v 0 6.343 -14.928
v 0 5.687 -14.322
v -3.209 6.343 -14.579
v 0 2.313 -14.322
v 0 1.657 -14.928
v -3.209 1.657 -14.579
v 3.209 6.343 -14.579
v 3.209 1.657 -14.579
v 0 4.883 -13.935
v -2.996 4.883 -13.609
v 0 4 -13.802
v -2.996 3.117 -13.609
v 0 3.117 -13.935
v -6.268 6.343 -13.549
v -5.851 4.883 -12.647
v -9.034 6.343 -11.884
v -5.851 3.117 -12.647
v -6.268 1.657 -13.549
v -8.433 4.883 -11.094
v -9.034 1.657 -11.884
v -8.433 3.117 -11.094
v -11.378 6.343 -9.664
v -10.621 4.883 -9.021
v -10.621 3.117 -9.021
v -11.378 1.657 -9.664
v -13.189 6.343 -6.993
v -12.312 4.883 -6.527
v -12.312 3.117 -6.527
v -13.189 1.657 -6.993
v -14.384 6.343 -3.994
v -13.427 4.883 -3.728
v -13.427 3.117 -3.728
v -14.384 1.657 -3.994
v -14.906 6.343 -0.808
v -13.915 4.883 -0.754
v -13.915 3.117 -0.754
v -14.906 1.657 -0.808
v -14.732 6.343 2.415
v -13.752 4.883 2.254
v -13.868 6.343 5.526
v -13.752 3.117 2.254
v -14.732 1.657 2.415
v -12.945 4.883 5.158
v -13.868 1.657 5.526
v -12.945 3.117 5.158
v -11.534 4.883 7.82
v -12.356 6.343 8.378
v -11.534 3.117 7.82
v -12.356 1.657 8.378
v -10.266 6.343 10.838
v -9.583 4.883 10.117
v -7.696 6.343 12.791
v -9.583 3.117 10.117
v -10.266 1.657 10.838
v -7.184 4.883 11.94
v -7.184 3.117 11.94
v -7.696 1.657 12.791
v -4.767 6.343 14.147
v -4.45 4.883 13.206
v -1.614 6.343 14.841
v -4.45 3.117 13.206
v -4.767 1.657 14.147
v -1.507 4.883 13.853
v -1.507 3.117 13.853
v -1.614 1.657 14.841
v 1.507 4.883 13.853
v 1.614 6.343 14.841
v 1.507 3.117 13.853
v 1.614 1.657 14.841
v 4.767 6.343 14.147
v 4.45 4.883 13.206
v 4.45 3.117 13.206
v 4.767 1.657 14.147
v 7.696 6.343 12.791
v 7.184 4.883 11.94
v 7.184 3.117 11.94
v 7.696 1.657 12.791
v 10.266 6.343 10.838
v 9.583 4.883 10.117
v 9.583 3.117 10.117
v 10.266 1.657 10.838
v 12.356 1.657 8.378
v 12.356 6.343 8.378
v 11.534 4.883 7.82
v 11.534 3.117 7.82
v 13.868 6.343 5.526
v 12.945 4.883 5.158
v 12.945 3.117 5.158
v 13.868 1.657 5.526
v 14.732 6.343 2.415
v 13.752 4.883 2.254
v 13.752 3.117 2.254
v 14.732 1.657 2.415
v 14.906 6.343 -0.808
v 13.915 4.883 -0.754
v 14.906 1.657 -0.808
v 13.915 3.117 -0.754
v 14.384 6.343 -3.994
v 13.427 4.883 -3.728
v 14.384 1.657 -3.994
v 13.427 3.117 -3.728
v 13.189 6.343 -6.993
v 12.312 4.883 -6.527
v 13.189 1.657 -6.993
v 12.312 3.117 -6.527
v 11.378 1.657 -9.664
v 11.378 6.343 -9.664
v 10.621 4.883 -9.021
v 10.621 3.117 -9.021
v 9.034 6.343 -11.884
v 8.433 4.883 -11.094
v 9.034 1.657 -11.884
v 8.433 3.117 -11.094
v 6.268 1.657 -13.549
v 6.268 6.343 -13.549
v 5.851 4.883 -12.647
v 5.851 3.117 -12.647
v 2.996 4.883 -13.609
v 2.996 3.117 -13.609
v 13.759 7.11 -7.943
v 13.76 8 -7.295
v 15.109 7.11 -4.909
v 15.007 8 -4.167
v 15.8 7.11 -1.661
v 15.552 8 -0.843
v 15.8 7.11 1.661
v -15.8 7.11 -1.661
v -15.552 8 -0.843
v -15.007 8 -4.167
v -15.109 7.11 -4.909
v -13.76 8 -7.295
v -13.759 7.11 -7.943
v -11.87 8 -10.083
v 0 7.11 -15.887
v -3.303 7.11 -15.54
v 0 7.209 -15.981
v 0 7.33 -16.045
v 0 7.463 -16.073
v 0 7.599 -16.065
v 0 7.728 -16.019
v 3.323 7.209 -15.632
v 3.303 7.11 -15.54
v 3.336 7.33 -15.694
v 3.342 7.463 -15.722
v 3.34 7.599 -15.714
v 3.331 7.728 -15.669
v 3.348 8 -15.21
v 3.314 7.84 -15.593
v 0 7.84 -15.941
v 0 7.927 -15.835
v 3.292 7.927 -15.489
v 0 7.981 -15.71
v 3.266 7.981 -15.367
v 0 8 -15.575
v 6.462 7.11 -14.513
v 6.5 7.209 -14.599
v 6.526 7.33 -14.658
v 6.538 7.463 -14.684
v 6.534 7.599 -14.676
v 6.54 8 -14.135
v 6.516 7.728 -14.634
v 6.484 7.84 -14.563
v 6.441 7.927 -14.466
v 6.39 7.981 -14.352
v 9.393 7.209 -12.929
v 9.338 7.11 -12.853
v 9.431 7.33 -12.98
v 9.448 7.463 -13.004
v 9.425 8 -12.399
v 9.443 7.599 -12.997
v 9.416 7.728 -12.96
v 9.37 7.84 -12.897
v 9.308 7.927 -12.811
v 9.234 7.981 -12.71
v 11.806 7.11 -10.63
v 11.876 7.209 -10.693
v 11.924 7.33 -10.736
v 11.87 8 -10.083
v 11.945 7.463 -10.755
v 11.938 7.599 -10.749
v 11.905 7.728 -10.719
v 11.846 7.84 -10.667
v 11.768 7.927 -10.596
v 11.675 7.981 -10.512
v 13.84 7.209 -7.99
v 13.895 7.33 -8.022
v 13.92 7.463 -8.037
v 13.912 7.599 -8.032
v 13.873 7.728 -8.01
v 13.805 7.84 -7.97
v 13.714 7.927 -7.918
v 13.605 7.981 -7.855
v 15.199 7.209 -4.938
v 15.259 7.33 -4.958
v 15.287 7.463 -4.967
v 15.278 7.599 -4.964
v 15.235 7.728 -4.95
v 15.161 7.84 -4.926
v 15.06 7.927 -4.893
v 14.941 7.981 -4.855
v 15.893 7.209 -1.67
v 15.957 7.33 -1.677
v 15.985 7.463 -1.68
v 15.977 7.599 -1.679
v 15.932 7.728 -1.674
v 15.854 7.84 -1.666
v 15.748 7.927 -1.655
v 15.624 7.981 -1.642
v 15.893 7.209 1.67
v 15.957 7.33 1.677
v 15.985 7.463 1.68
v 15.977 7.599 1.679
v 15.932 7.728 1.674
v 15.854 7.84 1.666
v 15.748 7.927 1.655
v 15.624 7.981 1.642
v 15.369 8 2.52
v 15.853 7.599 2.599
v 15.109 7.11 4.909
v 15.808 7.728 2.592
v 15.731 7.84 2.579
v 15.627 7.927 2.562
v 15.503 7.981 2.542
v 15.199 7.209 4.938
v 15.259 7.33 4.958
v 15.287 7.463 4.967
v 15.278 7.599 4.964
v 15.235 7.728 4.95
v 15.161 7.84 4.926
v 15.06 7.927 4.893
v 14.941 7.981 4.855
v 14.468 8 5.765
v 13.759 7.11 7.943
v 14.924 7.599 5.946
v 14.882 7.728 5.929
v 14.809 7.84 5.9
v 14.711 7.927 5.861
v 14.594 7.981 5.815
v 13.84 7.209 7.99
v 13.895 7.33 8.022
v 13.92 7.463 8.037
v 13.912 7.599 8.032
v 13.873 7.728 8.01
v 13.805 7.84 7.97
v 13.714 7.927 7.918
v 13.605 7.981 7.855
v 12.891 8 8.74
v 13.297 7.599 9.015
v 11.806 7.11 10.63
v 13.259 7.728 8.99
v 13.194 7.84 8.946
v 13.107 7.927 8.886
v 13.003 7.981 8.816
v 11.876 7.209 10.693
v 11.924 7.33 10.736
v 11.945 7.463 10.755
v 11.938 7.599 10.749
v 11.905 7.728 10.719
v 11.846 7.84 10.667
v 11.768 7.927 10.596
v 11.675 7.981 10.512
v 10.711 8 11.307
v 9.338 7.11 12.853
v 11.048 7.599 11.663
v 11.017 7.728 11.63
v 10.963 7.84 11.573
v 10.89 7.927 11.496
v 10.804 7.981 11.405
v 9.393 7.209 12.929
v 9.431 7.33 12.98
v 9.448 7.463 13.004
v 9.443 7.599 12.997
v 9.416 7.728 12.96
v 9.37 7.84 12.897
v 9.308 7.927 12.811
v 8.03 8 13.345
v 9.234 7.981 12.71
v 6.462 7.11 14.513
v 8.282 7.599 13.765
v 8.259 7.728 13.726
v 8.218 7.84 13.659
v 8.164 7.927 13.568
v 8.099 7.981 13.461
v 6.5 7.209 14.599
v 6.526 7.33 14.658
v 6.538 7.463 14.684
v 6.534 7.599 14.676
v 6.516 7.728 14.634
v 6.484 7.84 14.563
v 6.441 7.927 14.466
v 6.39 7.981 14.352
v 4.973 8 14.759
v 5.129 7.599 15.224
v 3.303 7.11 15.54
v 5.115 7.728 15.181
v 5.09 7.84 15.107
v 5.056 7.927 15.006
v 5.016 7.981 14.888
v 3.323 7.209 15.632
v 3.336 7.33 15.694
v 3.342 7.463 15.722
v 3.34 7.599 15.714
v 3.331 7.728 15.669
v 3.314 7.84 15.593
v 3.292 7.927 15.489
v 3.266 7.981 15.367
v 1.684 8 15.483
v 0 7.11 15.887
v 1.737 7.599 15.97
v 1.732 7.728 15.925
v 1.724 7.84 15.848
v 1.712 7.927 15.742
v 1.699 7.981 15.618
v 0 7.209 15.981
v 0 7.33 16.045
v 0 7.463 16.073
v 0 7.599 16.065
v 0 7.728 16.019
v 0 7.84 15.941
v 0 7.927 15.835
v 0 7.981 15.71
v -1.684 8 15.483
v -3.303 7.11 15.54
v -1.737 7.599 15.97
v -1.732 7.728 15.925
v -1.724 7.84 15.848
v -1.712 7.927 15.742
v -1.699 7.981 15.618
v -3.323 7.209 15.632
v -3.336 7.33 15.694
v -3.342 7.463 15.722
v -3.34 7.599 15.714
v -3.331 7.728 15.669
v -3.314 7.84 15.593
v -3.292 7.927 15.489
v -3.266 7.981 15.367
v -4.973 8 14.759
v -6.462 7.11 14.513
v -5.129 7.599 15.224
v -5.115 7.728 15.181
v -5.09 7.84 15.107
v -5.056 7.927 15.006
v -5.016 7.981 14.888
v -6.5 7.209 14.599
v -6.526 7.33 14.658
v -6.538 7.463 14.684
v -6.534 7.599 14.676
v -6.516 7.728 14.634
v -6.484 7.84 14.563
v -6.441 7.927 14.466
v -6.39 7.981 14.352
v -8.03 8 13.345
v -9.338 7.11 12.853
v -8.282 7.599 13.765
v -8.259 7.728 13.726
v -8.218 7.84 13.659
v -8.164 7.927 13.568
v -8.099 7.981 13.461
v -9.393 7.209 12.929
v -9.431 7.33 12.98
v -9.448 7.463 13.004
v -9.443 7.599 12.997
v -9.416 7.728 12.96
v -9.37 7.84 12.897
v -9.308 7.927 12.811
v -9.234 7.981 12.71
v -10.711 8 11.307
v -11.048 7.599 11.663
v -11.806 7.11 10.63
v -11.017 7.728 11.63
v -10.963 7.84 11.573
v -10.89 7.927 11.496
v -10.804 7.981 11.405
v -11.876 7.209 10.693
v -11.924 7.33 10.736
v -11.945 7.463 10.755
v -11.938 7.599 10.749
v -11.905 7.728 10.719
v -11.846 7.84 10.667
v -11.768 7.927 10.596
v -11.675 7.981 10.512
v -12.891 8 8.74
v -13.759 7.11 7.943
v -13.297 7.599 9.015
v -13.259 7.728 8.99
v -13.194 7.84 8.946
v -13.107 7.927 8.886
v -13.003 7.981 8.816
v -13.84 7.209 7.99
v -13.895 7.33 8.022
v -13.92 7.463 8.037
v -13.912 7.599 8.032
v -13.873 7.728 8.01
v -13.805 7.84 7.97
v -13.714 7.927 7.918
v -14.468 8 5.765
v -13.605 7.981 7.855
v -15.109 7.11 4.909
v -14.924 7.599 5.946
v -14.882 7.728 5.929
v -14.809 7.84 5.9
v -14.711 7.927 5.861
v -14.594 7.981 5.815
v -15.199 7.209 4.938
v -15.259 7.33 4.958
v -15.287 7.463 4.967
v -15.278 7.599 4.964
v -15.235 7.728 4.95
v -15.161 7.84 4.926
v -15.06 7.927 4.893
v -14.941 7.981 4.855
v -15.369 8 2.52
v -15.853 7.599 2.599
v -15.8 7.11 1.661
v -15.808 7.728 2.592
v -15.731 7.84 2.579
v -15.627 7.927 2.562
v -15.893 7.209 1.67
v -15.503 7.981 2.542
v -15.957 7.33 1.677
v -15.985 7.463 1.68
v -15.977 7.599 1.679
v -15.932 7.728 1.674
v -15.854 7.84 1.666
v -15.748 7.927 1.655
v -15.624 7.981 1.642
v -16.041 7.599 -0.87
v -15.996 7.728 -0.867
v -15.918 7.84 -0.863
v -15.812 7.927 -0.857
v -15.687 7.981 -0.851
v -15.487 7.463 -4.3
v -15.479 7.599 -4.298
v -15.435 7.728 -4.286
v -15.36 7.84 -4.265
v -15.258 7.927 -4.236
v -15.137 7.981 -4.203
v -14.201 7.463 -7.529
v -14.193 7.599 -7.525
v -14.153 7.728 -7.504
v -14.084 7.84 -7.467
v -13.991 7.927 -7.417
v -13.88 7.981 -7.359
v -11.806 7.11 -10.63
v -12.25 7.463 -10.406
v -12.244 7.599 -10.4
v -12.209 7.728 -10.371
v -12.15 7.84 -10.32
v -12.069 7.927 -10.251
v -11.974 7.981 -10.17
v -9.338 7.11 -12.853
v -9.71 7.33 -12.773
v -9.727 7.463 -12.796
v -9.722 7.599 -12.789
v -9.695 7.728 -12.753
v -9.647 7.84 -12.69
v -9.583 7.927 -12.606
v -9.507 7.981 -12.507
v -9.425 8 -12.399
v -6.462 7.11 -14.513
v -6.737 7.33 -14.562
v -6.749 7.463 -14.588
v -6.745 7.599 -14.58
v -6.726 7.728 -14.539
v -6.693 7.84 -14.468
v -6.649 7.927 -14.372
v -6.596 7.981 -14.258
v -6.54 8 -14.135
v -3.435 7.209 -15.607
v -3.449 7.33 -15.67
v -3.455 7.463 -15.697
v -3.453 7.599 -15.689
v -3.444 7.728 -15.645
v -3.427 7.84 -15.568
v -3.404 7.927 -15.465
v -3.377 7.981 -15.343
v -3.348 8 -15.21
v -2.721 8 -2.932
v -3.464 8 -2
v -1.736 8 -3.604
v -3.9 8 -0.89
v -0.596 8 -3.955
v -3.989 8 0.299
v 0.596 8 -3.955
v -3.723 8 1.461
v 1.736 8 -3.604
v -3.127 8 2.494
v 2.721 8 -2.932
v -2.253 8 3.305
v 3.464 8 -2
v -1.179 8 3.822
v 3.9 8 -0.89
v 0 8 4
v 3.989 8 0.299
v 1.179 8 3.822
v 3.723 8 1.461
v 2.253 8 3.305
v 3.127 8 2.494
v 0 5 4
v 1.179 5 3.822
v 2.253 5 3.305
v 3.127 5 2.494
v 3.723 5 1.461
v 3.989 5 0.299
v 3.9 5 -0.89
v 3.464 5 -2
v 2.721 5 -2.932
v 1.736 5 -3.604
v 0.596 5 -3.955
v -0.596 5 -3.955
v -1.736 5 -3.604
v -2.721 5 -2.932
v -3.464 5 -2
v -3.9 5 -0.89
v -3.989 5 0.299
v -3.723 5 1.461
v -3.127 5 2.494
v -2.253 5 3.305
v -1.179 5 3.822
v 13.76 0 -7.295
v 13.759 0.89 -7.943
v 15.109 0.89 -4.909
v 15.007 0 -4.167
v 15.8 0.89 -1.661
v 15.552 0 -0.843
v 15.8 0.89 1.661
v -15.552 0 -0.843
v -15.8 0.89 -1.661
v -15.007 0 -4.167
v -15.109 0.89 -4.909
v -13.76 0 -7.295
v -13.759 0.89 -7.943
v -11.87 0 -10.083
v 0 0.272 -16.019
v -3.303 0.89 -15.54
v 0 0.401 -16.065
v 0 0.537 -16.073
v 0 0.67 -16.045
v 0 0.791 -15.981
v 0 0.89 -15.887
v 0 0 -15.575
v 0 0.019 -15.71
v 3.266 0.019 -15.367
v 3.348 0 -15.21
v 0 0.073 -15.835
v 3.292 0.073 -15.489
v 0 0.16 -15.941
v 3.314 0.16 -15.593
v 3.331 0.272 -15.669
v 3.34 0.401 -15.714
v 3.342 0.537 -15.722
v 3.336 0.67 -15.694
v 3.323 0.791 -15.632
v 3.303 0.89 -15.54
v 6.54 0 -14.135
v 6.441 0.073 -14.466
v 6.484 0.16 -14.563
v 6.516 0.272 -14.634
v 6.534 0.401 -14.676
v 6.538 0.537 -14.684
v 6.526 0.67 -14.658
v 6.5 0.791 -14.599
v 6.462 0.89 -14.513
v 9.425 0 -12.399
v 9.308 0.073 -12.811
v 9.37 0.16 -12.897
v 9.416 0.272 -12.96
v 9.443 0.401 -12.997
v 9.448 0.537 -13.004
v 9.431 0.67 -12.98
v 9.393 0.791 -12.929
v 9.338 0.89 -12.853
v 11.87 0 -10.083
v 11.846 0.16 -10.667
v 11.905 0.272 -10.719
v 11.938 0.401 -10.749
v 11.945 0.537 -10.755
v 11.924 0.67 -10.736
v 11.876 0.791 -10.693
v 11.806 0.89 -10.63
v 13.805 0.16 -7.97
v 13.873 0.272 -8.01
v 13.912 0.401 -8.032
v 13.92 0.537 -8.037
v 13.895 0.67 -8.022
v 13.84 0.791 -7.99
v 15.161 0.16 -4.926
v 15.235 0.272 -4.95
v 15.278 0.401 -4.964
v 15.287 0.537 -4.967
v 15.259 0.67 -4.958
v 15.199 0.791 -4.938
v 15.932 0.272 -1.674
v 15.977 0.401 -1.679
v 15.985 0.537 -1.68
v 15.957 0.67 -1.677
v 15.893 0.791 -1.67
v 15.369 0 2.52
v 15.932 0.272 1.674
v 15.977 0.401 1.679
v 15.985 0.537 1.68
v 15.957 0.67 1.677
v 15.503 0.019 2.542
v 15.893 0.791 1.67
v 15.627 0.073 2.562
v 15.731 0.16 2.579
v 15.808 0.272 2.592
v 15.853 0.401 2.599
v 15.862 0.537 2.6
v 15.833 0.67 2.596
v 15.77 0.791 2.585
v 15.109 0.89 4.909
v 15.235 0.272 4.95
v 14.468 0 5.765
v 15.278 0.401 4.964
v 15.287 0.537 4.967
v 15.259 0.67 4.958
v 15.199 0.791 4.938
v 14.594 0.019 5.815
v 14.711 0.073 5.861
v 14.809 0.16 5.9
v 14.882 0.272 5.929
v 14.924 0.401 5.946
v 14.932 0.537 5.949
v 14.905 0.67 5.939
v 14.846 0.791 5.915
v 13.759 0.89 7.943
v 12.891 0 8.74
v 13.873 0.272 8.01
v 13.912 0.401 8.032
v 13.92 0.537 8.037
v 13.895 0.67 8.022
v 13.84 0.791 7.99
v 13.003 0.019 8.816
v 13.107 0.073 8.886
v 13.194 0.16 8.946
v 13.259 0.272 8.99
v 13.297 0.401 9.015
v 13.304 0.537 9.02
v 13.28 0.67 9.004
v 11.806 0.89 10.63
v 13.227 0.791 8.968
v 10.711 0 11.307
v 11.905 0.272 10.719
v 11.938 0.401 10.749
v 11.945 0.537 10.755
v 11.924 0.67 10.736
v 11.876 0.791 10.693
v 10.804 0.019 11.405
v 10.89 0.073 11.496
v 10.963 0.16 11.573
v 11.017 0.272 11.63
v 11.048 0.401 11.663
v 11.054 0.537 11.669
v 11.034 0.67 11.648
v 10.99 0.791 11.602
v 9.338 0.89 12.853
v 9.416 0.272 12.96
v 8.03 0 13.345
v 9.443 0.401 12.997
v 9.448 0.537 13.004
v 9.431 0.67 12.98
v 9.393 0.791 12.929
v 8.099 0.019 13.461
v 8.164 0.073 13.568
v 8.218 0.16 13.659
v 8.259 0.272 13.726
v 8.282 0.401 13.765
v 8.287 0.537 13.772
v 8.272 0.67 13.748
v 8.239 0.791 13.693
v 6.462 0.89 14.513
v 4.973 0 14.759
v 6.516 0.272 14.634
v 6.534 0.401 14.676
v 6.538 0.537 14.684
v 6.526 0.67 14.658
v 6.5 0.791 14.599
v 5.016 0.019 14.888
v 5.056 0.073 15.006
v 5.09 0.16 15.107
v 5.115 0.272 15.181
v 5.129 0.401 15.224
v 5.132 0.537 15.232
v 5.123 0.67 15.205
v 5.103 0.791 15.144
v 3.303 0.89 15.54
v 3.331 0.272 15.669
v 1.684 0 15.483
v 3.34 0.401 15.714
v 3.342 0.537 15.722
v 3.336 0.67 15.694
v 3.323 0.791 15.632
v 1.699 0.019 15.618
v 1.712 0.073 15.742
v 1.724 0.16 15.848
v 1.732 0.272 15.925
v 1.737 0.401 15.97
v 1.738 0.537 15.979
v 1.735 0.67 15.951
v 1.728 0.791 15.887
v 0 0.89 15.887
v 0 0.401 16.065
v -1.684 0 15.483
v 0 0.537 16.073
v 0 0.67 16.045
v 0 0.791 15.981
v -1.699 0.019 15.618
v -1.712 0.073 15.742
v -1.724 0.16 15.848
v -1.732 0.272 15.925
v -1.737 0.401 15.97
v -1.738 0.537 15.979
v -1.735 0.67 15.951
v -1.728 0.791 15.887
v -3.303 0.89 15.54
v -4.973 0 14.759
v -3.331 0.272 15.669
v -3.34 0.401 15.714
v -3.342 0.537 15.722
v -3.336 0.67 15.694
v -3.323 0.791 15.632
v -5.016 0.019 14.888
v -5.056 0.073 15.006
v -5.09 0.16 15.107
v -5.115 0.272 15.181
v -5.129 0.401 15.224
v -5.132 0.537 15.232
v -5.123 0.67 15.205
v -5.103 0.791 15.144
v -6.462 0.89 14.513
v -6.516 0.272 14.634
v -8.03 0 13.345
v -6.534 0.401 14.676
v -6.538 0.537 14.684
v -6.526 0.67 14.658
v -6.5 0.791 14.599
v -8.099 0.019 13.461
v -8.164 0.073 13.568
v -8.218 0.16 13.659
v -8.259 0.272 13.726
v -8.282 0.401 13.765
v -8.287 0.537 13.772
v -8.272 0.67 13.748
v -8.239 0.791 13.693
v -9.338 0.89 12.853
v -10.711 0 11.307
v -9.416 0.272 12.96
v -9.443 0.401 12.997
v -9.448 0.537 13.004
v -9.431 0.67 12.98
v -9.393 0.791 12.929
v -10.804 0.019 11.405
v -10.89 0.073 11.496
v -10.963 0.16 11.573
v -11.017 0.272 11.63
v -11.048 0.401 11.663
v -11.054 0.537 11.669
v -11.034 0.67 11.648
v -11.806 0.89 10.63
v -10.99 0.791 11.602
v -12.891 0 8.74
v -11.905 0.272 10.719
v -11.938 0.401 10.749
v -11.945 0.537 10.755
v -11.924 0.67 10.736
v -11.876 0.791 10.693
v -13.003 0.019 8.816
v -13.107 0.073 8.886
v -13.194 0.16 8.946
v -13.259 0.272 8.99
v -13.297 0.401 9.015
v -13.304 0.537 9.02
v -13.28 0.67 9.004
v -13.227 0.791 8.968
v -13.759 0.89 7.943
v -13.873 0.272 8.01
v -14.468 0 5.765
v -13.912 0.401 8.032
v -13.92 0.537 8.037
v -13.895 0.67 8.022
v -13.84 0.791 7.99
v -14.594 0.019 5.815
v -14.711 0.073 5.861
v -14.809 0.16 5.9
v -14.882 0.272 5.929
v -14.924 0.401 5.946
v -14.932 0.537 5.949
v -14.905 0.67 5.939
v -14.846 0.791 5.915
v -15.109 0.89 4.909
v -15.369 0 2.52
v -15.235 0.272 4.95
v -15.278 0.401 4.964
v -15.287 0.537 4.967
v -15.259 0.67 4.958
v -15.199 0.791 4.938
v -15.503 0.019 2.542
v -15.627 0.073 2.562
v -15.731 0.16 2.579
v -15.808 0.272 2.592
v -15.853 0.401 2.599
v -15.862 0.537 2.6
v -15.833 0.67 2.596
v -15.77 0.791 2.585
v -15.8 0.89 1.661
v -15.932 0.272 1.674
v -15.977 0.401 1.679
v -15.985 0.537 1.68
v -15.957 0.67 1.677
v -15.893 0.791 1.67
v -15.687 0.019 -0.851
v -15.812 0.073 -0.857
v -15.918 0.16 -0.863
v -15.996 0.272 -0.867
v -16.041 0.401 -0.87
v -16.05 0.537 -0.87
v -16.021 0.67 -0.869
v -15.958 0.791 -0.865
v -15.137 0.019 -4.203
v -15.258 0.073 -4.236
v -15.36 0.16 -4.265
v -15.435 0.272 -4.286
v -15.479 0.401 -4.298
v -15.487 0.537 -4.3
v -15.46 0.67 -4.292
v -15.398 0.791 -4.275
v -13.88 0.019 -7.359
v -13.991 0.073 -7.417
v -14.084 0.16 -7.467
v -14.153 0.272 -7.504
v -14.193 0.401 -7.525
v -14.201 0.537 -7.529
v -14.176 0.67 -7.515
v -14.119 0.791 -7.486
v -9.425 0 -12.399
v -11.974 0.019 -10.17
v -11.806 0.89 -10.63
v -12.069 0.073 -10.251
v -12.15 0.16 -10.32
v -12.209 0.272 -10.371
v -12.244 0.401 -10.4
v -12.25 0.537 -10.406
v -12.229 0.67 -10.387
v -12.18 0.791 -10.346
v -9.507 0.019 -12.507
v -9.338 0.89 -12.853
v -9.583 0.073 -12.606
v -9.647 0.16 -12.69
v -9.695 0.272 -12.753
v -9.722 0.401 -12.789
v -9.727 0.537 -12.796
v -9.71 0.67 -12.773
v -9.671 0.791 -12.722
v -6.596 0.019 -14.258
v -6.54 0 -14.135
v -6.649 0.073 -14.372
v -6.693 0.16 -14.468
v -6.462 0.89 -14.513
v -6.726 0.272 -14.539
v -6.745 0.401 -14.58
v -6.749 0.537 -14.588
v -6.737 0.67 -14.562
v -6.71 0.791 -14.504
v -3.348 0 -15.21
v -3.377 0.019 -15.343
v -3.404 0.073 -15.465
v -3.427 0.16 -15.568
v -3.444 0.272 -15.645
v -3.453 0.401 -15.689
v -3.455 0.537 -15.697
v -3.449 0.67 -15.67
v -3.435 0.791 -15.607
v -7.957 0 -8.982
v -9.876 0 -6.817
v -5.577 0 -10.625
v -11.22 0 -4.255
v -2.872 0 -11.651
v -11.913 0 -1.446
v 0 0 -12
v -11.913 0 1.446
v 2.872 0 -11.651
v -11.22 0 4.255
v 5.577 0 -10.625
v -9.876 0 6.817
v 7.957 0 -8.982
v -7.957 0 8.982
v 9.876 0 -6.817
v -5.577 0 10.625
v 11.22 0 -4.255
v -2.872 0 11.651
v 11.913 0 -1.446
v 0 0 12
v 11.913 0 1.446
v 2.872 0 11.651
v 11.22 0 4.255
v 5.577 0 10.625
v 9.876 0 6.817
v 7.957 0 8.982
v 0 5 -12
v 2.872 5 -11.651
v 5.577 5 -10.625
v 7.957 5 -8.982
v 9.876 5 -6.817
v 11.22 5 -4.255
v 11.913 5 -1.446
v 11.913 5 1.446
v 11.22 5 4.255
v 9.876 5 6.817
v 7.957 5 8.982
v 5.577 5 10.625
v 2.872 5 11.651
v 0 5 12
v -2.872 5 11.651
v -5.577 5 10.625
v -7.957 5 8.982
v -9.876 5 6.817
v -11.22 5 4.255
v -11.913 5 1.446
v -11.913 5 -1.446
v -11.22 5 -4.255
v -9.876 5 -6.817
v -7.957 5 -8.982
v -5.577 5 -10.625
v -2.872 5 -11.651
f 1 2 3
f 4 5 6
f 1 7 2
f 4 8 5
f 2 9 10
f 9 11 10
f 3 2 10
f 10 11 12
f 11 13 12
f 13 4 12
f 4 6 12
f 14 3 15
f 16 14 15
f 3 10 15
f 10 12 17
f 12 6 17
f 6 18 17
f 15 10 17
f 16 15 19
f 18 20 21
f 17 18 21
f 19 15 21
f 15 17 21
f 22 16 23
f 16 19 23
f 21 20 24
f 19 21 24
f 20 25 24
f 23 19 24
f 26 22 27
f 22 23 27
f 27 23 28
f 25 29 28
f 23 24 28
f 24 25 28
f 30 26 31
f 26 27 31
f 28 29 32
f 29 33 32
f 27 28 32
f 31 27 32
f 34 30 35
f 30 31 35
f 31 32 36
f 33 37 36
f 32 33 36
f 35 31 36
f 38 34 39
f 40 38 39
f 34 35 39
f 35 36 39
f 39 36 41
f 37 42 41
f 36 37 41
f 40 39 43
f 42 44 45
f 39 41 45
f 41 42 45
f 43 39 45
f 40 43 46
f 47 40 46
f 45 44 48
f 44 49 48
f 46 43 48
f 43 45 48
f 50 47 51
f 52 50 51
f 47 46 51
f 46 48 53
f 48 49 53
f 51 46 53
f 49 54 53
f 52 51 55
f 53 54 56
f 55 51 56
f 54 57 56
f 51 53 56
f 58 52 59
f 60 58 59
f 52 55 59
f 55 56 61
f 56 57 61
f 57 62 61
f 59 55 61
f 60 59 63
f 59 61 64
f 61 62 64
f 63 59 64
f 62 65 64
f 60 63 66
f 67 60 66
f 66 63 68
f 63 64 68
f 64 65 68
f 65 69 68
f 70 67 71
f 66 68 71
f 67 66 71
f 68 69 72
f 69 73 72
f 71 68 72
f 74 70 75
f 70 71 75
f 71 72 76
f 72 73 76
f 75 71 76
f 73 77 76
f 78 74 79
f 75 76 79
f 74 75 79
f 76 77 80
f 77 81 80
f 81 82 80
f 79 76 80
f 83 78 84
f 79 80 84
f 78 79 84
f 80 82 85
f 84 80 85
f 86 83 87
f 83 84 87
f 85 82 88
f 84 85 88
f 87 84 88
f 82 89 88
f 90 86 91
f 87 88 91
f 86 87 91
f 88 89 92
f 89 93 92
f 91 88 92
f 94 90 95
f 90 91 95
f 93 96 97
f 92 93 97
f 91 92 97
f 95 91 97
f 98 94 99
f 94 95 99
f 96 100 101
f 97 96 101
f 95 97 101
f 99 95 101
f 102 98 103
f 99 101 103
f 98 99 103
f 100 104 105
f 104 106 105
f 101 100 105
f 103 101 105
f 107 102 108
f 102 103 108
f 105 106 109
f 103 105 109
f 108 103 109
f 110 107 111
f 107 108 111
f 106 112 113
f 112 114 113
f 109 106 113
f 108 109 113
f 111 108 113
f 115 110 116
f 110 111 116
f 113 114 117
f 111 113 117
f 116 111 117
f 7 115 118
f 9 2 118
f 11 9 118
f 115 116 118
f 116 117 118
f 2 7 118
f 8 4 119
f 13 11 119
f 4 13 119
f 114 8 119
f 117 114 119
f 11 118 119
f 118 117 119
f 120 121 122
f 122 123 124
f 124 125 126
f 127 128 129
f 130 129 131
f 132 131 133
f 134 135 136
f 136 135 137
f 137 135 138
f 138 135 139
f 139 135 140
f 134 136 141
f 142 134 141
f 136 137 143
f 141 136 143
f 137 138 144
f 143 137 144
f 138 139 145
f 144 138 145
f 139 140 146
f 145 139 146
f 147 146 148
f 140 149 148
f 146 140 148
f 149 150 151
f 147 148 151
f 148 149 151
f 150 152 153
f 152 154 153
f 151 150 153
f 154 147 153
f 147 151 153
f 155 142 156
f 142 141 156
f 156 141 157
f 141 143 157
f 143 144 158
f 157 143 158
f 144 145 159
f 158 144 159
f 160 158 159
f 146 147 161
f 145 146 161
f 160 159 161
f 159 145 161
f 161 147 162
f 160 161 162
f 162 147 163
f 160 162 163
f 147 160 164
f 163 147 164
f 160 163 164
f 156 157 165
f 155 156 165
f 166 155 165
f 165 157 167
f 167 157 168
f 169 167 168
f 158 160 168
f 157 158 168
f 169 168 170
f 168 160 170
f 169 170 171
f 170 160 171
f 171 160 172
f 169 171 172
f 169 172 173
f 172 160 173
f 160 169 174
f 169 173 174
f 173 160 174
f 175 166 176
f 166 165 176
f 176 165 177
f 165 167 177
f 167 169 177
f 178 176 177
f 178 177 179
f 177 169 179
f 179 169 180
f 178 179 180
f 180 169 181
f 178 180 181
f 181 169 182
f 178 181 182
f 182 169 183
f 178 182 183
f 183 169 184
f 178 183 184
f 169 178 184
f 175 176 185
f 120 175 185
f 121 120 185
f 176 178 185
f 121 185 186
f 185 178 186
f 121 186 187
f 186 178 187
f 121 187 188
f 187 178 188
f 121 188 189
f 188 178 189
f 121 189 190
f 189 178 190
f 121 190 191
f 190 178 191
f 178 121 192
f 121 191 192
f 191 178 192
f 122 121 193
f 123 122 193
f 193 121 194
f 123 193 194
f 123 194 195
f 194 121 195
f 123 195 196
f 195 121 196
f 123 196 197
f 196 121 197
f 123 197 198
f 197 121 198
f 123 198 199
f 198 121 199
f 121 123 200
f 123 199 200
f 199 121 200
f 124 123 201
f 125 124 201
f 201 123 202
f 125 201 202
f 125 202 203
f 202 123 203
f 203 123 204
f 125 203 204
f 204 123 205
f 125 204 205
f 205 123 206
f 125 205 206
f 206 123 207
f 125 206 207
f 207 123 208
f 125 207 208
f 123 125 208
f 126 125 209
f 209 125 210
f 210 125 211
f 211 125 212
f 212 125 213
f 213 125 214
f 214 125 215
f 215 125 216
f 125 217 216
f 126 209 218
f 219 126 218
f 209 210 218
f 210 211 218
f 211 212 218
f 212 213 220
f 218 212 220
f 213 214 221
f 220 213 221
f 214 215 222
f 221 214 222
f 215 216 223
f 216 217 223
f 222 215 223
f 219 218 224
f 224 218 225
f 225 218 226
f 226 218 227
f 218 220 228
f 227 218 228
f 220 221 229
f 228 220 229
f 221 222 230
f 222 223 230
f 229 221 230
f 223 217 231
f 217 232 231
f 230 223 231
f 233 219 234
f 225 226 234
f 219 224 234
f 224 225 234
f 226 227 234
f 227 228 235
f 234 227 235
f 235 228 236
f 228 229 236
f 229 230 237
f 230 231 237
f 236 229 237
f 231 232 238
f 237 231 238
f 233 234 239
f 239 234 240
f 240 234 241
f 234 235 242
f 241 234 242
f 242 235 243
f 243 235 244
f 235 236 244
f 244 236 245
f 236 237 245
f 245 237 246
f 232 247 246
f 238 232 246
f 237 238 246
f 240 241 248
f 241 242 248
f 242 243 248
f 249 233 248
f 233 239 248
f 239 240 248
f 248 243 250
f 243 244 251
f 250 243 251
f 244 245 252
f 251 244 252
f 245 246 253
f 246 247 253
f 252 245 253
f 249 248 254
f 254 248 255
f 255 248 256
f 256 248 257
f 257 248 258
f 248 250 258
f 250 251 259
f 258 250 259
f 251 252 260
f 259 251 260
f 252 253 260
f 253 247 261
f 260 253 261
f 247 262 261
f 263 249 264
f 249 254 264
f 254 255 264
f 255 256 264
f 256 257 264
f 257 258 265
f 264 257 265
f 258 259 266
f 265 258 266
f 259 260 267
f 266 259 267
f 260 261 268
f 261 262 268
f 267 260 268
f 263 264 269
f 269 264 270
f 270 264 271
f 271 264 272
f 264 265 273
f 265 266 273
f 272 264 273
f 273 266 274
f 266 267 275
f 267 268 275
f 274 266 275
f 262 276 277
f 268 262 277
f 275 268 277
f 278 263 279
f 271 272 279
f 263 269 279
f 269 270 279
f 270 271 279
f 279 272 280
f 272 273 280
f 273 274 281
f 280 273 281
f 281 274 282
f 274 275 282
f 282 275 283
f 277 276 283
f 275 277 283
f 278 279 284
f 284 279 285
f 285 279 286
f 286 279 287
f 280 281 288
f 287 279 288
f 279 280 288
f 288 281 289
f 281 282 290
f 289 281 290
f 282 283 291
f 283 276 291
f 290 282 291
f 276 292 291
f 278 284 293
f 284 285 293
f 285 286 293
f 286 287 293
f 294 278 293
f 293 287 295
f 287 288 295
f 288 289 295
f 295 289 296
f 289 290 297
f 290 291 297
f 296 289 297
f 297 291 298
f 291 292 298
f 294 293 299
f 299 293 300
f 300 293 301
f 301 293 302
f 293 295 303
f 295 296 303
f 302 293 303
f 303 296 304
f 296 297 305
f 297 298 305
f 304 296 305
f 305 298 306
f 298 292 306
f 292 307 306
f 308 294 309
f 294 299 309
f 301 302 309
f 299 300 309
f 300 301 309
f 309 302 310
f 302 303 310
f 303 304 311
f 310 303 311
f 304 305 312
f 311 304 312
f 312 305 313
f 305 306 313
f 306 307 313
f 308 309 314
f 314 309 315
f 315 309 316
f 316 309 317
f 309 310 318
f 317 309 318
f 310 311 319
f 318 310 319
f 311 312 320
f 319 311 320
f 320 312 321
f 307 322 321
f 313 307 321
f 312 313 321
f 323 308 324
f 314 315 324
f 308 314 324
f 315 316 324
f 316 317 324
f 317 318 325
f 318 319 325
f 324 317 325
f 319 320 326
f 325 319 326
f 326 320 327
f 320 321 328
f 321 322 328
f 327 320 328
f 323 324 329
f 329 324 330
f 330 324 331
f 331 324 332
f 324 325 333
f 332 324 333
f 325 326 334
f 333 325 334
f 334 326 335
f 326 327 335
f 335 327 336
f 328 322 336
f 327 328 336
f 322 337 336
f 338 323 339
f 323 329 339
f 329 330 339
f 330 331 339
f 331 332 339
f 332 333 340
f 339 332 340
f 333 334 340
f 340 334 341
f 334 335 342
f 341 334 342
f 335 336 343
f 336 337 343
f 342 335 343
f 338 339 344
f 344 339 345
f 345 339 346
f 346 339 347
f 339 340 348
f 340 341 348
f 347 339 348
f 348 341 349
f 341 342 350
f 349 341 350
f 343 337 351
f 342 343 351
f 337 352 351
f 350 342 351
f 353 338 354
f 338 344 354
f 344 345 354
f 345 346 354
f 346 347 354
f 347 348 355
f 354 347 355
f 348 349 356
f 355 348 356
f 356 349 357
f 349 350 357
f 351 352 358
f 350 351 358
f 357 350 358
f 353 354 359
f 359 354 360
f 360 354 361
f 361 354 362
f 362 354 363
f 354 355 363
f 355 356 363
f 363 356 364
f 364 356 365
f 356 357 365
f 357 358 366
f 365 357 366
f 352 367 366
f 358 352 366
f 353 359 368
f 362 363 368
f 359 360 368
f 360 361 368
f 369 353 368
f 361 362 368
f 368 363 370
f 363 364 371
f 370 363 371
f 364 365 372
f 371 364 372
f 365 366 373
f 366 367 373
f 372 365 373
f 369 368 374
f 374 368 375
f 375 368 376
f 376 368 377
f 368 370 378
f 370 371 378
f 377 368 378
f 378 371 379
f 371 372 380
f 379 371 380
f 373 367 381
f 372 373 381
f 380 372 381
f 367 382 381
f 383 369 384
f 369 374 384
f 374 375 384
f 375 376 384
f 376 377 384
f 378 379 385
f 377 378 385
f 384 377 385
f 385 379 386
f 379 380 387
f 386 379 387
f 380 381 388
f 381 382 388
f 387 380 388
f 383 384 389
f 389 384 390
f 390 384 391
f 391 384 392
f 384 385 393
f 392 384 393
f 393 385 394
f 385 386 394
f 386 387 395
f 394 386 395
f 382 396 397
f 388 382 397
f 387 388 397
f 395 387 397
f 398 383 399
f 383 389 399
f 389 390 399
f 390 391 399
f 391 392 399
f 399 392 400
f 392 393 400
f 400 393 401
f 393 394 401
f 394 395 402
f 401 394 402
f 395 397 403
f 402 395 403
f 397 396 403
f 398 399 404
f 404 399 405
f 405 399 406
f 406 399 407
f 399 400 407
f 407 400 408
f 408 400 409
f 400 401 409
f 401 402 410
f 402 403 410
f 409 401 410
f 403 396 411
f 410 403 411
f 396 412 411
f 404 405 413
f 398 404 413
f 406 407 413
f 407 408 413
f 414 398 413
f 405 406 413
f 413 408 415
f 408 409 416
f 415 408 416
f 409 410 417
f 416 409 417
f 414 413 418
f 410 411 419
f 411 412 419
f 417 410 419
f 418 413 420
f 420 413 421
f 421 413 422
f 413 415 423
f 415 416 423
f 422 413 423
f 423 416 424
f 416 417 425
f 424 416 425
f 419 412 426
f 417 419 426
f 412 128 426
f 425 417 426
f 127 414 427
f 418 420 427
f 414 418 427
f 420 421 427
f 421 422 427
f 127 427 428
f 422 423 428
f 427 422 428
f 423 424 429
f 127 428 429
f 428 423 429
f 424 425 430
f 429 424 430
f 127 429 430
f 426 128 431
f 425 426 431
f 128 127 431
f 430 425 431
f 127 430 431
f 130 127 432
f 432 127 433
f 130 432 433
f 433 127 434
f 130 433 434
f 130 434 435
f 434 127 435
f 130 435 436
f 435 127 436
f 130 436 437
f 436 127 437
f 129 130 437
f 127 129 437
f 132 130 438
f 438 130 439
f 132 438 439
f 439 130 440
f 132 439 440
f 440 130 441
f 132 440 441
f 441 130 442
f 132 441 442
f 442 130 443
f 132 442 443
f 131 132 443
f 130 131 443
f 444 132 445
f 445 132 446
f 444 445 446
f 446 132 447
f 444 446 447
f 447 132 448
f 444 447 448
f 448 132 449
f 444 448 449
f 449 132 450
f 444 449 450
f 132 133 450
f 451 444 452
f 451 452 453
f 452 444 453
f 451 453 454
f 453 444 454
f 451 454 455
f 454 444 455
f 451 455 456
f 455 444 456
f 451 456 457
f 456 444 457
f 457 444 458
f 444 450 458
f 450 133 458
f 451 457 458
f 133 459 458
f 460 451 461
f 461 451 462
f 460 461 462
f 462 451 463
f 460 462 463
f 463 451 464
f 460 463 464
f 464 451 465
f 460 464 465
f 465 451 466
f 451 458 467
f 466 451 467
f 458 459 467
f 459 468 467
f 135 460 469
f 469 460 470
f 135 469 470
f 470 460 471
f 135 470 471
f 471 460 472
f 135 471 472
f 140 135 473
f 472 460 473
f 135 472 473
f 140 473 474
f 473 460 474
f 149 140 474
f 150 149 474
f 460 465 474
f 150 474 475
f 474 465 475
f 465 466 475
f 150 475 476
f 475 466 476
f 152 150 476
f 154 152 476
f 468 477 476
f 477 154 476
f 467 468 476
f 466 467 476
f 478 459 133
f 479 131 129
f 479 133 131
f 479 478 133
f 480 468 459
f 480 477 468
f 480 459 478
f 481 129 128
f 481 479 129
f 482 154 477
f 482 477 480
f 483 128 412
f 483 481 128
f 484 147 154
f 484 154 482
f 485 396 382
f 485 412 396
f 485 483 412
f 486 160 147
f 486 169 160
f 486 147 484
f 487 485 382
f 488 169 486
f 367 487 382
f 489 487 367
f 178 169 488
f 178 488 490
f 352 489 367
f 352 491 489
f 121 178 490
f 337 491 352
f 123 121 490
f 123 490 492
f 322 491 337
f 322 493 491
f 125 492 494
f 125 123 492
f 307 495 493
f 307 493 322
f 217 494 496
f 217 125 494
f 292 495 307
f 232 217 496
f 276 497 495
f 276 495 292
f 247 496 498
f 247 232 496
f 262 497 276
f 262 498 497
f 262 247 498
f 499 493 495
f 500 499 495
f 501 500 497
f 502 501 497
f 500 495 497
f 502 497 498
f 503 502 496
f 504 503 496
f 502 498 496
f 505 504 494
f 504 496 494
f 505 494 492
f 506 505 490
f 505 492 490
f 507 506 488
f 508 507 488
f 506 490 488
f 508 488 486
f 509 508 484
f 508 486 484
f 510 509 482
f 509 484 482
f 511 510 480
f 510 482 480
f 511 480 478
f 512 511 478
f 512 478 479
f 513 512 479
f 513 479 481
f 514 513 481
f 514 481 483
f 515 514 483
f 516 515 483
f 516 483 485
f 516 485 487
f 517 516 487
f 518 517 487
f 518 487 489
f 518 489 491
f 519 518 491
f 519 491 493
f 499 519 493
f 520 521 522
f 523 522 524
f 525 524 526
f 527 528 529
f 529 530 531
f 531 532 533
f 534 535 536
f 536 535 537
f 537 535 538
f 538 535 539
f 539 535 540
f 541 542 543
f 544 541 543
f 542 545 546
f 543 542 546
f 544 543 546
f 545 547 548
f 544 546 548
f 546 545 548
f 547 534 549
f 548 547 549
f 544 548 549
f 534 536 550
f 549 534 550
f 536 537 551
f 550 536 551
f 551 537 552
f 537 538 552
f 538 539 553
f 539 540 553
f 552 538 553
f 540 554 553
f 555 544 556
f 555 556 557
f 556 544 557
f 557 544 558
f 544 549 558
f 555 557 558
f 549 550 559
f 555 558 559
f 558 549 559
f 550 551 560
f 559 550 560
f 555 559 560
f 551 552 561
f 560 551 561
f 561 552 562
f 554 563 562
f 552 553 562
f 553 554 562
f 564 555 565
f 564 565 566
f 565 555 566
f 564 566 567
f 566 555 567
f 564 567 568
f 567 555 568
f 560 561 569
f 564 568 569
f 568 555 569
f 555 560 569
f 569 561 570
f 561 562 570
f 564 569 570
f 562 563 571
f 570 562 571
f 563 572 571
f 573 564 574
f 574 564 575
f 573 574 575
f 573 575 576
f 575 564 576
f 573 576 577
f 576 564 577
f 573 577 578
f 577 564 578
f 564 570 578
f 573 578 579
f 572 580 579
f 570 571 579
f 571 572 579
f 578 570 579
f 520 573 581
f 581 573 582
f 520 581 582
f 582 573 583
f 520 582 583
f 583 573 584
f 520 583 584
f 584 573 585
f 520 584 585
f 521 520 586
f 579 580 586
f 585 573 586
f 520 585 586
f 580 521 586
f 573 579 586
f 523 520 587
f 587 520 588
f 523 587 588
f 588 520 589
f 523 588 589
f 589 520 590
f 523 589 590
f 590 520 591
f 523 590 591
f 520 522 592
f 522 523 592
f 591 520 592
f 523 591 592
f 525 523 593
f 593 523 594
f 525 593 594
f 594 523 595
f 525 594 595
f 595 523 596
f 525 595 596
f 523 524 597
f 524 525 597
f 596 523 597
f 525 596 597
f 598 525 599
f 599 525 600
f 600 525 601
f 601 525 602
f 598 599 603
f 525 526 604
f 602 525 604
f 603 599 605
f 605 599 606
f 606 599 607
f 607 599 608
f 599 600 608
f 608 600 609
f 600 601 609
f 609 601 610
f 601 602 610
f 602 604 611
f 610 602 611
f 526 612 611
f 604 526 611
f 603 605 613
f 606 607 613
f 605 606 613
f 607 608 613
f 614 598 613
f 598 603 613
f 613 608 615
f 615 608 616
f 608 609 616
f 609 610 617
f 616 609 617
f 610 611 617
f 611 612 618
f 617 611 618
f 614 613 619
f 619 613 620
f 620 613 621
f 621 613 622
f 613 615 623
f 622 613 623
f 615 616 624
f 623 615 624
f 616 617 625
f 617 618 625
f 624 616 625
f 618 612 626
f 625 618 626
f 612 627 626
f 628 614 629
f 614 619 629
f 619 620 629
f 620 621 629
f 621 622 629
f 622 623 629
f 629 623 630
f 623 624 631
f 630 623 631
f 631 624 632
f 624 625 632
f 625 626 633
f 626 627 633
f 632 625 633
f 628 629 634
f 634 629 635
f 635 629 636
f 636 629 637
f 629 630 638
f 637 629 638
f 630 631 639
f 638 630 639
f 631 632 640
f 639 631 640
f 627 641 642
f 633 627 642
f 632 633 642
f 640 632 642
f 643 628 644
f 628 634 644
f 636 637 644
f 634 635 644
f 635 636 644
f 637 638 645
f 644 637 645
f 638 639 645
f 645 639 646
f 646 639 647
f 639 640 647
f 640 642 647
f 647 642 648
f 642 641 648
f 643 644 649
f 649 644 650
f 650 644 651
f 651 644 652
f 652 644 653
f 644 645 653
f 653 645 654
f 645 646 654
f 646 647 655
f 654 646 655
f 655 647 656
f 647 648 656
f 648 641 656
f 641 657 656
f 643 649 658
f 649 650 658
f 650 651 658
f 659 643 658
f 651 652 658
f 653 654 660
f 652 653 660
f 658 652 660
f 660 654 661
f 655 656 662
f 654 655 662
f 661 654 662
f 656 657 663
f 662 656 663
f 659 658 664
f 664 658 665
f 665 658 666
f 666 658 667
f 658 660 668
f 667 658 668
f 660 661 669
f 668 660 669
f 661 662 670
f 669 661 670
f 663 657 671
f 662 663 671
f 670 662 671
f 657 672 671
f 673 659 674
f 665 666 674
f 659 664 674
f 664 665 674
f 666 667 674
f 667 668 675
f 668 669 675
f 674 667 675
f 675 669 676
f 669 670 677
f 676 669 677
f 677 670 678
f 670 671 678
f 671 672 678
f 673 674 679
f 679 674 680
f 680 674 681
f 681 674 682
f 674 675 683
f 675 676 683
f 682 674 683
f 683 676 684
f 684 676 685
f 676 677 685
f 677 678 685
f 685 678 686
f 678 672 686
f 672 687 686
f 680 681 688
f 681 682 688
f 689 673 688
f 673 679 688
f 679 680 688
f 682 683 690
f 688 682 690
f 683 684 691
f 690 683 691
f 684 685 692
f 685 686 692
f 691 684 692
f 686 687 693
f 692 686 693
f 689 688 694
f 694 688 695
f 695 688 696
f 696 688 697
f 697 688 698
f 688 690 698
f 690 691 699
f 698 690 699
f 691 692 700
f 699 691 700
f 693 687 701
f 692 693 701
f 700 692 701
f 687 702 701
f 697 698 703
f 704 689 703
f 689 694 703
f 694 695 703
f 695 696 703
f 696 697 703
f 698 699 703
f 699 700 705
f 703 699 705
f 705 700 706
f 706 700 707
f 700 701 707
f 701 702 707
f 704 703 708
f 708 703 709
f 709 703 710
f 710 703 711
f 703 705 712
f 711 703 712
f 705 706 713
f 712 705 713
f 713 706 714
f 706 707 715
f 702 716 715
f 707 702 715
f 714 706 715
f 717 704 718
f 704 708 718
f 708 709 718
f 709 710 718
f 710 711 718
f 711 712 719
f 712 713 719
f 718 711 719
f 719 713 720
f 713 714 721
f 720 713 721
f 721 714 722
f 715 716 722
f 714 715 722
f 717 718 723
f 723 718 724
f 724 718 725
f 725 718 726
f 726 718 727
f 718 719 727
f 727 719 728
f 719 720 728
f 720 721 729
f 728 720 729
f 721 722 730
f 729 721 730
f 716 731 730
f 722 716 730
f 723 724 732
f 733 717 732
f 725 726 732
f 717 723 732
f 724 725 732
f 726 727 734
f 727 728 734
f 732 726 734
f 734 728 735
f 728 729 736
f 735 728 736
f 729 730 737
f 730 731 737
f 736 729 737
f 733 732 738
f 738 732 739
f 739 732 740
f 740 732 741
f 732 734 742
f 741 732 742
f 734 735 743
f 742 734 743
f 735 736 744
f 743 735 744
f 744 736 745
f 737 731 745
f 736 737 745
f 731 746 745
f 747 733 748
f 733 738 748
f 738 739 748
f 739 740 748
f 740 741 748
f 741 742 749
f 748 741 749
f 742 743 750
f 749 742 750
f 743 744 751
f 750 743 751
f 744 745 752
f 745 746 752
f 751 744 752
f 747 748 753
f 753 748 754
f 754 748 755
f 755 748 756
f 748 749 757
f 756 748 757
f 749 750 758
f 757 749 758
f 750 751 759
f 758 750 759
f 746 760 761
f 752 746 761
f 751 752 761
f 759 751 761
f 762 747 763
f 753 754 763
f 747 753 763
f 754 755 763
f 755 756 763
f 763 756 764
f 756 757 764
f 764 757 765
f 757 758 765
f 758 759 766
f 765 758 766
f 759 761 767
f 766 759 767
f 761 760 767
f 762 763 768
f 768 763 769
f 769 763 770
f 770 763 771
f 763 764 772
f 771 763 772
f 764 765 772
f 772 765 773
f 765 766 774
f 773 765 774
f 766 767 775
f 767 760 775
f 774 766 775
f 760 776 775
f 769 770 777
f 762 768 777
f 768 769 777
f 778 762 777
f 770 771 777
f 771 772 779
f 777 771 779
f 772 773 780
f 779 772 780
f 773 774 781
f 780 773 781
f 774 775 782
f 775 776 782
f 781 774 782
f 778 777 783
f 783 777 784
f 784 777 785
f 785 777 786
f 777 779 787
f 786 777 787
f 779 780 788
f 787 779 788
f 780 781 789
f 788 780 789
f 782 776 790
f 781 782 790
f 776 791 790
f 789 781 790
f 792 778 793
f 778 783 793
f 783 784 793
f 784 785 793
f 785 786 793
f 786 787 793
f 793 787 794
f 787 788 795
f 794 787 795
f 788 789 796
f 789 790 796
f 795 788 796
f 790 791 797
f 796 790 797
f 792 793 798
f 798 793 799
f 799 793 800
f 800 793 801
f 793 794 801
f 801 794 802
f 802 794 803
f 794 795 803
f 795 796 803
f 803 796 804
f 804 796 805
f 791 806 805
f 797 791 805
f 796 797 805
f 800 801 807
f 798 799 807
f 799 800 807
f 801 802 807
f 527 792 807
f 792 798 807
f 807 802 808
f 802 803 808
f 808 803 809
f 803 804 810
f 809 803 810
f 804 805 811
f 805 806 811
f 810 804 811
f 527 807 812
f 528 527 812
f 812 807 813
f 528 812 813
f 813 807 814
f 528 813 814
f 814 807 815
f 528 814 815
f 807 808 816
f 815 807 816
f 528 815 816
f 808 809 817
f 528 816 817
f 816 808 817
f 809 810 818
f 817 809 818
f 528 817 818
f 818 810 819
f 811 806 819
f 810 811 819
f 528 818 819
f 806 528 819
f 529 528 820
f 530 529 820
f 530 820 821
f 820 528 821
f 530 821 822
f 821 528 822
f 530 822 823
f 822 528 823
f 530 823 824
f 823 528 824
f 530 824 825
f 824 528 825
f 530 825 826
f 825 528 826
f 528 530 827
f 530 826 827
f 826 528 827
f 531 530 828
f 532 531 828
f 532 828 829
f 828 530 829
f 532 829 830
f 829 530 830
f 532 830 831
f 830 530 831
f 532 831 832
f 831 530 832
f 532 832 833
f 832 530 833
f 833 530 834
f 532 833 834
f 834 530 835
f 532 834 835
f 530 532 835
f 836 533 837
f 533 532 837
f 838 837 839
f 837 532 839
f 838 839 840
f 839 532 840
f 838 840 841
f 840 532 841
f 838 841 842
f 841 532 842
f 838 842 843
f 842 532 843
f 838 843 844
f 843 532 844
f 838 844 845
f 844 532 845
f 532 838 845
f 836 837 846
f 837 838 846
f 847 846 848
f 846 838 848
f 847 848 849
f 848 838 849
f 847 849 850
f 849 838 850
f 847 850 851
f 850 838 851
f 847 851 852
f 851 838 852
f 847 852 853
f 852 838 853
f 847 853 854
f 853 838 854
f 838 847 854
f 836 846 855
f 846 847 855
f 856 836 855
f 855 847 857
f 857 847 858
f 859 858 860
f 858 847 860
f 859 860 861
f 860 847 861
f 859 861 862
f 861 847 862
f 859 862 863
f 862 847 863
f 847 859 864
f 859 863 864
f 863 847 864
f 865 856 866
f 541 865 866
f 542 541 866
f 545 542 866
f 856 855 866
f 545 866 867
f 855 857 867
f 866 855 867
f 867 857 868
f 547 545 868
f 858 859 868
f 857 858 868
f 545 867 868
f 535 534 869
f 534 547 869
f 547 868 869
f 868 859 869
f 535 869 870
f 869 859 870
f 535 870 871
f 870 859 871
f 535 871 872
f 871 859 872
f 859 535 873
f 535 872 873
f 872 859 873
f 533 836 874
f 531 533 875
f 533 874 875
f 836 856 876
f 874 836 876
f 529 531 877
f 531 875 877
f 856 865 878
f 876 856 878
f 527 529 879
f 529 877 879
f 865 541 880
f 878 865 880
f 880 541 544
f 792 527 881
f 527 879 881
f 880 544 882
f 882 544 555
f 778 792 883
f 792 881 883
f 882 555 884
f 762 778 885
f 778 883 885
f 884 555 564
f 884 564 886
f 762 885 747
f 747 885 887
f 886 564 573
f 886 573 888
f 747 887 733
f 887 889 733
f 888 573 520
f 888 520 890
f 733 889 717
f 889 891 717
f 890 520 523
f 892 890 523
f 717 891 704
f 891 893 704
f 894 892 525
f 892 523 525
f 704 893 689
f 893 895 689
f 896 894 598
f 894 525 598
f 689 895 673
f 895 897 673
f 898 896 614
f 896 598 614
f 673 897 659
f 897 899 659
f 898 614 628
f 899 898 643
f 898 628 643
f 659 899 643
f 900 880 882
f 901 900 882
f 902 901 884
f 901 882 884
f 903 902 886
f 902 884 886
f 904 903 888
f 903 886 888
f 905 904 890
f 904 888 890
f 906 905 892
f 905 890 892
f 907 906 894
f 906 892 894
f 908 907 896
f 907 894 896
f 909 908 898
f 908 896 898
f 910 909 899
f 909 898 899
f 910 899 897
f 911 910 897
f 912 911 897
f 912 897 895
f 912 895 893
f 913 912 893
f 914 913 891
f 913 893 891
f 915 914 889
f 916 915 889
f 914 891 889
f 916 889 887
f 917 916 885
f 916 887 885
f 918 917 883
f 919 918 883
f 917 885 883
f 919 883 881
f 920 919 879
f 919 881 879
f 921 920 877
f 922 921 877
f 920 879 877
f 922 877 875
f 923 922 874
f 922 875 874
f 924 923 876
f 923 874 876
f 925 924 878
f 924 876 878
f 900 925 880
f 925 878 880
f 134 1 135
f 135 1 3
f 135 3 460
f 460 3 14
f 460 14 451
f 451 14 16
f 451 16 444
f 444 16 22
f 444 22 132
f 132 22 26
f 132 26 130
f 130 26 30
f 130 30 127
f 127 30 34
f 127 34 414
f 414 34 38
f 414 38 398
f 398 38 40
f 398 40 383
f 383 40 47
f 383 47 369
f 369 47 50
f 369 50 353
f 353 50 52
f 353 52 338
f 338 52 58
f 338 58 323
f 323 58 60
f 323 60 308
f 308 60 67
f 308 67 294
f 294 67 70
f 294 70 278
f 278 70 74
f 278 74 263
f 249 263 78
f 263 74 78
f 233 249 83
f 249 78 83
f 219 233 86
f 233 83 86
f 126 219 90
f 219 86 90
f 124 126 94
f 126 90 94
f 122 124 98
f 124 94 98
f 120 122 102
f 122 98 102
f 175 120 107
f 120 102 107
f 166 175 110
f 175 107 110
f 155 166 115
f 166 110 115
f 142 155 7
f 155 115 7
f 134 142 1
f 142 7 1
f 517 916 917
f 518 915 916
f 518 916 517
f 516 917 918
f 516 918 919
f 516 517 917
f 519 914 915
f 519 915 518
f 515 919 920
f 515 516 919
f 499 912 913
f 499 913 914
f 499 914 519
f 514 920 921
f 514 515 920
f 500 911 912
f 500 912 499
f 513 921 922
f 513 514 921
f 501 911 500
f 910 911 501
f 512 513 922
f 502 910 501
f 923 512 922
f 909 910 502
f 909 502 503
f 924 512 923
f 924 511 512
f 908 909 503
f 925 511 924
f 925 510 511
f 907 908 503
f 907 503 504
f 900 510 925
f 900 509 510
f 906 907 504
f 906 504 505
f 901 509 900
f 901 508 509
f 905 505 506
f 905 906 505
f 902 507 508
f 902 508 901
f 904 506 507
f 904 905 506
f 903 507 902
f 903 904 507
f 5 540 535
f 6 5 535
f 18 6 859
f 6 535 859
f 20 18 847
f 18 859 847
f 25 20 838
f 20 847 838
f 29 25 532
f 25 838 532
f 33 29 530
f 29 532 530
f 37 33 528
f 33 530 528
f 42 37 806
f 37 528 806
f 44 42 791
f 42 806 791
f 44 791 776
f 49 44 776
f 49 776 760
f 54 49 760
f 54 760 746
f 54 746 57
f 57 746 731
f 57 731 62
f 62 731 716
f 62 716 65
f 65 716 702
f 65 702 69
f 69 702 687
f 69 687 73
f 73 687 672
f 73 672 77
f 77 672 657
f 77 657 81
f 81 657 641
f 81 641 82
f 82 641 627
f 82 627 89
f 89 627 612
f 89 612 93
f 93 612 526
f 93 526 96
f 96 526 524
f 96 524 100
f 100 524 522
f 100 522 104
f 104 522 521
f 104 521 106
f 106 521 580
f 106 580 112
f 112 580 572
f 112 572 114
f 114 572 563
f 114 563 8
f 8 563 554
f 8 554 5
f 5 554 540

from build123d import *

# Parameters (mm, degrees)
SKETCH_1_R          = 17
EXTRUDE_1_DEPTH     = 8
SKETCH_2_R          = 12
CUT_EXTRUDE_2_DEPTH = 5
FILLET_1_R          = 0.5
SKETCH_5_R          = 4
CUT_EXTRUDE_3_DEPTH = 25.099505092


with BuildPart() as part:
    # Эскиз1 → Вытянуть1 (new body)
    with BuildSketch(Plane(origin=(0, 0, 0), x_dir=(1, 0, 0), z_dir=(0, 1, 0))):
        with Locations(Location((0, 0, 0), (0, 0, 270))):
            Circle(SKETCH_1_R)
    extrude(amount=EXTRUDE_1_DEPTH)

    # Эскиз2 → Вытянуть2 (cut)
    with BuildSketch(Plane.XZ):
        with Locations(Location((0, 0, 0), (0, 0, 270))):
            Circle(SKETCH_2_R)
    extrude(amount=-CUT_EXTRUDE_2_DEPTH, mode=Mode.SUBTRACT)

    # Эскиз4 → Вырез-Повернуть1 (revolve, cut)
    with BuildSketch(Plane(origin=(0, 0, 0), x_dir=(0, 0, -1), z_dir=(1, 0, 0))):
        with BuildLine():
            Line((17, 8), (14.928258035, 6.342606428))
            ThreePointArc((14.928258035, 6.342606428), (13.802343178, 4), (14.928258035, 1.657393572))
            Line((14.928258035, 1.657393572), (17, 0))
            Line((17, 0), (17, 8))
        make_face()
    revolve(axis=Axis((0, 11, 0), (0, 1, 0)), mode=Mode.SUBTRACT)

    # Скругление1
    fillet_1_edges = [part.edges().sort_by_distance(p)[0] for p in [
        (0, 8, 17),
        (0, 0, 17),
    ]]
    fillet(fillet_1_edges, radius=FILLET_1_R)

    # Эскиз5 → Вытянуть3 (cut, through all)
    with BuildSketch(Plane(origin=(0, 8, 0), x_dir=(1, 0, 0), z_dir=(0, 1, 0))):
        with Locations(Location((0, 0, 0), (0, 0, 270))):
            Circle(SKETCH_5_R)
    extrude(amount=-CUT_EXTRUDE_3_DEPTH, mode=Mode.SUBTRACT)


solid = part.part
